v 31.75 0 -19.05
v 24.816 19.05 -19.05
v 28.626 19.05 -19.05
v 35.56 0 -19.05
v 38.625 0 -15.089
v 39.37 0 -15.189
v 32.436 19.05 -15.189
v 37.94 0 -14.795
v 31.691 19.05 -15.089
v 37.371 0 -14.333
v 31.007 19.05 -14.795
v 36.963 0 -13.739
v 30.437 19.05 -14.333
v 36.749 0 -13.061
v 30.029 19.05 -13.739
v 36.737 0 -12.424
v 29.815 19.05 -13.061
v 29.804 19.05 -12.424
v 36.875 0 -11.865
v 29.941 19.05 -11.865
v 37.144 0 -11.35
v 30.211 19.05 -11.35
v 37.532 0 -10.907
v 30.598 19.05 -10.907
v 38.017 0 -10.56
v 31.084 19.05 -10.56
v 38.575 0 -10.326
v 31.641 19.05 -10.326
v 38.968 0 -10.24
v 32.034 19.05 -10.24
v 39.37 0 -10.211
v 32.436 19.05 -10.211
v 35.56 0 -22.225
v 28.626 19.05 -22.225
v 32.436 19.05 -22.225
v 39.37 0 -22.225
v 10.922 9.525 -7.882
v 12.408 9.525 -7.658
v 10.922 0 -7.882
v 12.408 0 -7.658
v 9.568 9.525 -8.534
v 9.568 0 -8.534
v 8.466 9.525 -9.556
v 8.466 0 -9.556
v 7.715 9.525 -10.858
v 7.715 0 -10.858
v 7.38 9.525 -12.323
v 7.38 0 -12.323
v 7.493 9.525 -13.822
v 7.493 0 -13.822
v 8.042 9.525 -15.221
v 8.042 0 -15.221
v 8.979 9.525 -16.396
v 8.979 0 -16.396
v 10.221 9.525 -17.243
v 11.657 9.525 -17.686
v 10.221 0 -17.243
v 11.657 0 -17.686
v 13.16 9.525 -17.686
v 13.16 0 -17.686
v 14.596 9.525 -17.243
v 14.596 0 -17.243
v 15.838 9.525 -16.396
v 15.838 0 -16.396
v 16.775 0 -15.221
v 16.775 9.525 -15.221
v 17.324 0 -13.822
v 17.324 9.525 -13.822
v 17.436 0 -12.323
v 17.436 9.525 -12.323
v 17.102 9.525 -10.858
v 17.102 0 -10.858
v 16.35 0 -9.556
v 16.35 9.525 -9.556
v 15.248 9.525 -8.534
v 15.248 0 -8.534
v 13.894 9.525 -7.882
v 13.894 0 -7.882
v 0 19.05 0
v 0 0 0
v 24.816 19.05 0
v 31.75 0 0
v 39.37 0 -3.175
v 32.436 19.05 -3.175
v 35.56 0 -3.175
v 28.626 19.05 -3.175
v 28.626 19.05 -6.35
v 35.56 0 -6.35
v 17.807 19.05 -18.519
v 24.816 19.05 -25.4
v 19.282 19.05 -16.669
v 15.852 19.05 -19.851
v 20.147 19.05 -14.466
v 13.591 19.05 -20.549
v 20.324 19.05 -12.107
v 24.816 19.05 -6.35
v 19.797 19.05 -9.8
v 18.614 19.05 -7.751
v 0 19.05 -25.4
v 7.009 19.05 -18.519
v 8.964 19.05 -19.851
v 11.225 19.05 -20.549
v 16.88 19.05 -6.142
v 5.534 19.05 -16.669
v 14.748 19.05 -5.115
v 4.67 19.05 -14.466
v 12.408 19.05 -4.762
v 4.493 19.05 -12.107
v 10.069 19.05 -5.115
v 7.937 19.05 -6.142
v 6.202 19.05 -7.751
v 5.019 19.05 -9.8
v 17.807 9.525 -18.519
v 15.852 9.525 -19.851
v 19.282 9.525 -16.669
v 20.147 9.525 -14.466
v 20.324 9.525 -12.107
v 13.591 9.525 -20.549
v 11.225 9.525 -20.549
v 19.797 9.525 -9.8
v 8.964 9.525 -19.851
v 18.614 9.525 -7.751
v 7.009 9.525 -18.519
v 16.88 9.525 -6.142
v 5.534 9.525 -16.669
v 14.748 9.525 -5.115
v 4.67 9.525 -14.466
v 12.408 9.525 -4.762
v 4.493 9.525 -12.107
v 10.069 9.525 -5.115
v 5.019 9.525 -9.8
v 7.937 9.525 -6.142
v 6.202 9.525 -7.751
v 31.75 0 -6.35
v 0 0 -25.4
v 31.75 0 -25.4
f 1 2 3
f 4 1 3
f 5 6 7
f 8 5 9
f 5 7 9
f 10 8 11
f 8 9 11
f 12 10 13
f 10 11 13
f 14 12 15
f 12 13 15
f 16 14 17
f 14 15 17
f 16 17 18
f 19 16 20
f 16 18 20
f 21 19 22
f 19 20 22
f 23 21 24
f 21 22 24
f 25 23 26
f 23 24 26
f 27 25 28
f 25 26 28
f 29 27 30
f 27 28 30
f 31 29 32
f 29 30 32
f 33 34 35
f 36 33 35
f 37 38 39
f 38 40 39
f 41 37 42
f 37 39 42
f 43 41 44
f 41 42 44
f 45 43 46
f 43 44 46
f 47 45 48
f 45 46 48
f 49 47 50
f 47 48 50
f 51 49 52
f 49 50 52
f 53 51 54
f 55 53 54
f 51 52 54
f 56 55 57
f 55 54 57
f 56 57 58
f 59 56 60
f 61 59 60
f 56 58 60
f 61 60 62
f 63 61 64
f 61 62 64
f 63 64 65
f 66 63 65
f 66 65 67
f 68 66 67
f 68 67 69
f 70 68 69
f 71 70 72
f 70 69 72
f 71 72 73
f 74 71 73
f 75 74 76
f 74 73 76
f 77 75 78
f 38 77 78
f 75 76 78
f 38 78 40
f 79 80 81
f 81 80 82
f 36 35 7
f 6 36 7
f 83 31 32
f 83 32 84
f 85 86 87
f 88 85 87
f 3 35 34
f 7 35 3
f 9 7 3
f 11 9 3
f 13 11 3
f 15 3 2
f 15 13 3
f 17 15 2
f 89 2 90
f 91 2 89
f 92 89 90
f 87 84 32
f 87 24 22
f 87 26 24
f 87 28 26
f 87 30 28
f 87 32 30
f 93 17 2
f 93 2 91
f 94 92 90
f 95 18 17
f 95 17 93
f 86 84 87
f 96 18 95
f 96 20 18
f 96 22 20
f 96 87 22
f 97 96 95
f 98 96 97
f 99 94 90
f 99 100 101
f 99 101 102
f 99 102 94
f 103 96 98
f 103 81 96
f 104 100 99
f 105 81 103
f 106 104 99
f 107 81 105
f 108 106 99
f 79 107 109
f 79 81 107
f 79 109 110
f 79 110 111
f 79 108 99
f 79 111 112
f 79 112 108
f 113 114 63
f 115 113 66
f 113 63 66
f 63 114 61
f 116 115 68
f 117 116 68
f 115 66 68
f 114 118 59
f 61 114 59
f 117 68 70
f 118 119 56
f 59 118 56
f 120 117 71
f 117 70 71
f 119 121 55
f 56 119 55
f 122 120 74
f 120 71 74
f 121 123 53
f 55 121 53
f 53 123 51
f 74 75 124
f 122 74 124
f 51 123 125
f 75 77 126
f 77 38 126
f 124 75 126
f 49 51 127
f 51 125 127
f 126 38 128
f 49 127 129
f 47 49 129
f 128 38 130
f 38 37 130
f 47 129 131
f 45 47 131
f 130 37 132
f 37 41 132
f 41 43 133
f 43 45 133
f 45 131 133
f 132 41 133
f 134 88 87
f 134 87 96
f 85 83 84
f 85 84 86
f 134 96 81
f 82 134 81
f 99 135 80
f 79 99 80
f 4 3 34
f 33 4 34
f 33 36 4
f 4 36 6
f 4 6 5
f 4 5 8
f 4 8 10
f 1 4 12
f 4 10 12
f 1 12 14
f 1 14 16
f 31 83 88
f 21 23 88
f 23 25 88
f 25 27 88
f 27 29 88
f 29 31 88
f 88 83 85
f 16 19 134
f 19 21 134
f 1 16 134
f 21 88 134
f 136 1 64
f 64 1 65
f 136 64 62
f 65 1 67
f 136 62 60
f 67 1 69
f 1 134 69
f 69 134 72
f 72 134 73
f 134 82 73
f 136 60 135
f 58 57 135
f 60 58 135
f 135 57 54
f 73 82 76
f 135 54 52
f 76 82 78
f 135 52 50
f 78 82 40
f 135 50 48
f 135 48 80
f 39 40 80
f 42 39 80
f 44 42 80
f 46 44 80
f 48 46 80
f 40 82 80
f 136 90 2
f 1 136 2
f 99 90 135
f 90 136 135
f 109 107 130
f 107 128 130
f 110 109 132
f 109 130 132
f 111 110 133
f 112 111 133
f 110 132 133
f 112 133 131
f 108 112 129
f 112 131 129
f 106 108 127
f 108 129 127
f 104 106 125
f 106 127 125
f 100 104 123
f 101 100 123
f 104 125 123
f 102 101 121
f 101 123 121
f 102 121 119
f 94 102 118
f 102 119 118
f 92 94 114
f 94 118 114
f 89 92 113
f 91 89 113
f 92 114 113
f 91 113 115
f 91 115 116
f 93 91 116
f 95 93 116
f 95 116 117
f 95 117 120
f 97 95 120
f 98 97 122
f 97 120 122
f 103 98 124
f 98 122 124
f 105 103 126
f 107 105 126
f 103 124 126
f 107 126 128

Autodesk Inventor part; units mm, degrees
ref_plane "YZ Plane" through (0, 0, 0) normal (1, 0, 0) x (0, 1, 0)
ref_plane "XZ Plane" through (0, 0, 0) normal (0, 1, 0) x (-1, 0, 0)
sketch "Sketch1" plane through (0, 0, 0) normal (0, 1, 0) x (-1, 0, 0)
  line L0 (0, 0) -> (-39.37, 0)
  line L1 (-39.37, 0) -> (-39.37, -25.4)
  line L2 (-39.37, -25.4) -> (0, -25.4)
  line L3 (0, -25.4) -> (0, 0)
  line L4 (-35.56, -25.4) -> (-35.56, 0)
  line L5 (0, -12.7) -> (-39.37, -12.7) construction
  line L6 (-31.75, -25.4) -> (-31.75, 0)
  line L7 (-31.75, -19.05) -> (-35.56, -19.05)
  line L8 (-31.75, -6.35) -> (-35.56, -6.35)
  line L9 (-35.56, -22.225) -> (-39.37, -22.225)
  line L10 (-35.56, -3.175) -> (-39.37, -3.175)
  point P0 (-35.56, -6.35)
  point P1 (-39.37, -3.175)
  dimension "d7" = 25.4
  dimension "d10" = 3.81
  dimension "d34" = 3.81
  dimension "d35" = 12.7
  dimension "d36" = 19.05
  dimension "d37" = 31.75
extrude "Extrusion1" add sketch "Sketch1" along normal blind 19.05
sketch "Sketch3" plane through (0, 0, 0) normal (0, 0, 1) x (1, 0, 0)
  line L0 (0, 0) -> (39.37, 0) projected
  line L1 (39.37, 0) -> (39.37, 19.05) projected
  line L2 (0, 19.05) -> (39.37, 19.05) projected
  line L3 (0, 0) -> (0, 19.05) projected
  line L4 (24.8164, 19.05) -> (31.75, 0)
  dimension "d14" = 70
  dimension "d15" = 31.75
sweep "Sweep1" cut profiles "Sketch1" path "Sketch3" path curves L4 contours L6 L8 L4 L0 | L4 L10 L1 L0 | L2 L4 L7 L6 | L2 L1 L9 L4
ref_plane "Work Plane3" through (39.37, 0, 0) normal (-0.342, 0.9397, 0) x (0, 0, -1)
ref_plane "Work Plane2" through (39.37, 0, 0) normal (-0.9397, -0.342, 0) x (0, 0, -1)
sketch "Sketch5" plane through (39.37, 0, 0) normal (-0.342, 0.9397, 0) x (0, 0, -1)
  point P0 (12.7, 0)
hole "Hole2" at (39.37, 0, -12.7) direction (-0.342, 0.9397, 0) diameter 4.9784 end through all
split "Split1" plane through (39.37, 0, 0) removes the side toward (0.9397, 0.342, 0)
sketch "Sketch4" plane through (0, 19.05, 0) normal (0, 1, 0) x (1, 0, 0)
  line L0 (32.4364, 15.1892) -> (32.4364, 22.225) projected
  line L1 (32.4364, 22.225) -> (28.6264, 22.225) projected
  line L2 (28.6264, 22.225) -> (28.6264, 19.05) projected
  line L3 (28.6264, 19.05) -> (24.8164, 19.05) projected
  line L4 (24.8164, 19.05) -> (24.8164, 25.4) projected
  line L5 (24.8164, 25.4) -> (0, 25.4) projected
  line L6 (0, 25.4) -> (0, 0) projected
  line L7 (0, 0) -> (24.8164, 0) projected
  line L8 (24.8164, 0) -> (24.8164, 6.35) projected
  line L9 (24.8164, 6.35) -> (28.6264, 6.35) projected
  line L10 (28.6264, 6.35) -> (28.6264, 3.175) projected
  line L11 (28.6264, 3.175) -> (32.4364, 3.175) projected
  line L12 (32.4364, 3.175) -> (32.4364, 10.2108) projected
  ellipse E0 centre (32.4364, 12.7) end of major axis (29.7874, 12.7) minor radius 2.4892 (32.4364, 15.1892) -> (32.4364, 10.2108) ccw projected
  point P0 (12.4082, 12.7)
  point P1 (0, 12.7)
  point P2 (12.4082, 25.4)
hole "Hole1" at (12.4082, 19.05, -12.7) direction (0, -1, 0) diameter 10.0838 end through all counterbore diameter 15.875 counterbore depth 9.525
equation "\"d10\" = d34"
equation "\"d34\" = slotWidth"
equation "\"d14\" = slopeAngle"
equation "\"d18\" = slopeAngle"
equation "\"slopeAngle\" = 70deg"
equation "\"slotWidth\" = 3.81"
properties material "Steel, Alloy"
